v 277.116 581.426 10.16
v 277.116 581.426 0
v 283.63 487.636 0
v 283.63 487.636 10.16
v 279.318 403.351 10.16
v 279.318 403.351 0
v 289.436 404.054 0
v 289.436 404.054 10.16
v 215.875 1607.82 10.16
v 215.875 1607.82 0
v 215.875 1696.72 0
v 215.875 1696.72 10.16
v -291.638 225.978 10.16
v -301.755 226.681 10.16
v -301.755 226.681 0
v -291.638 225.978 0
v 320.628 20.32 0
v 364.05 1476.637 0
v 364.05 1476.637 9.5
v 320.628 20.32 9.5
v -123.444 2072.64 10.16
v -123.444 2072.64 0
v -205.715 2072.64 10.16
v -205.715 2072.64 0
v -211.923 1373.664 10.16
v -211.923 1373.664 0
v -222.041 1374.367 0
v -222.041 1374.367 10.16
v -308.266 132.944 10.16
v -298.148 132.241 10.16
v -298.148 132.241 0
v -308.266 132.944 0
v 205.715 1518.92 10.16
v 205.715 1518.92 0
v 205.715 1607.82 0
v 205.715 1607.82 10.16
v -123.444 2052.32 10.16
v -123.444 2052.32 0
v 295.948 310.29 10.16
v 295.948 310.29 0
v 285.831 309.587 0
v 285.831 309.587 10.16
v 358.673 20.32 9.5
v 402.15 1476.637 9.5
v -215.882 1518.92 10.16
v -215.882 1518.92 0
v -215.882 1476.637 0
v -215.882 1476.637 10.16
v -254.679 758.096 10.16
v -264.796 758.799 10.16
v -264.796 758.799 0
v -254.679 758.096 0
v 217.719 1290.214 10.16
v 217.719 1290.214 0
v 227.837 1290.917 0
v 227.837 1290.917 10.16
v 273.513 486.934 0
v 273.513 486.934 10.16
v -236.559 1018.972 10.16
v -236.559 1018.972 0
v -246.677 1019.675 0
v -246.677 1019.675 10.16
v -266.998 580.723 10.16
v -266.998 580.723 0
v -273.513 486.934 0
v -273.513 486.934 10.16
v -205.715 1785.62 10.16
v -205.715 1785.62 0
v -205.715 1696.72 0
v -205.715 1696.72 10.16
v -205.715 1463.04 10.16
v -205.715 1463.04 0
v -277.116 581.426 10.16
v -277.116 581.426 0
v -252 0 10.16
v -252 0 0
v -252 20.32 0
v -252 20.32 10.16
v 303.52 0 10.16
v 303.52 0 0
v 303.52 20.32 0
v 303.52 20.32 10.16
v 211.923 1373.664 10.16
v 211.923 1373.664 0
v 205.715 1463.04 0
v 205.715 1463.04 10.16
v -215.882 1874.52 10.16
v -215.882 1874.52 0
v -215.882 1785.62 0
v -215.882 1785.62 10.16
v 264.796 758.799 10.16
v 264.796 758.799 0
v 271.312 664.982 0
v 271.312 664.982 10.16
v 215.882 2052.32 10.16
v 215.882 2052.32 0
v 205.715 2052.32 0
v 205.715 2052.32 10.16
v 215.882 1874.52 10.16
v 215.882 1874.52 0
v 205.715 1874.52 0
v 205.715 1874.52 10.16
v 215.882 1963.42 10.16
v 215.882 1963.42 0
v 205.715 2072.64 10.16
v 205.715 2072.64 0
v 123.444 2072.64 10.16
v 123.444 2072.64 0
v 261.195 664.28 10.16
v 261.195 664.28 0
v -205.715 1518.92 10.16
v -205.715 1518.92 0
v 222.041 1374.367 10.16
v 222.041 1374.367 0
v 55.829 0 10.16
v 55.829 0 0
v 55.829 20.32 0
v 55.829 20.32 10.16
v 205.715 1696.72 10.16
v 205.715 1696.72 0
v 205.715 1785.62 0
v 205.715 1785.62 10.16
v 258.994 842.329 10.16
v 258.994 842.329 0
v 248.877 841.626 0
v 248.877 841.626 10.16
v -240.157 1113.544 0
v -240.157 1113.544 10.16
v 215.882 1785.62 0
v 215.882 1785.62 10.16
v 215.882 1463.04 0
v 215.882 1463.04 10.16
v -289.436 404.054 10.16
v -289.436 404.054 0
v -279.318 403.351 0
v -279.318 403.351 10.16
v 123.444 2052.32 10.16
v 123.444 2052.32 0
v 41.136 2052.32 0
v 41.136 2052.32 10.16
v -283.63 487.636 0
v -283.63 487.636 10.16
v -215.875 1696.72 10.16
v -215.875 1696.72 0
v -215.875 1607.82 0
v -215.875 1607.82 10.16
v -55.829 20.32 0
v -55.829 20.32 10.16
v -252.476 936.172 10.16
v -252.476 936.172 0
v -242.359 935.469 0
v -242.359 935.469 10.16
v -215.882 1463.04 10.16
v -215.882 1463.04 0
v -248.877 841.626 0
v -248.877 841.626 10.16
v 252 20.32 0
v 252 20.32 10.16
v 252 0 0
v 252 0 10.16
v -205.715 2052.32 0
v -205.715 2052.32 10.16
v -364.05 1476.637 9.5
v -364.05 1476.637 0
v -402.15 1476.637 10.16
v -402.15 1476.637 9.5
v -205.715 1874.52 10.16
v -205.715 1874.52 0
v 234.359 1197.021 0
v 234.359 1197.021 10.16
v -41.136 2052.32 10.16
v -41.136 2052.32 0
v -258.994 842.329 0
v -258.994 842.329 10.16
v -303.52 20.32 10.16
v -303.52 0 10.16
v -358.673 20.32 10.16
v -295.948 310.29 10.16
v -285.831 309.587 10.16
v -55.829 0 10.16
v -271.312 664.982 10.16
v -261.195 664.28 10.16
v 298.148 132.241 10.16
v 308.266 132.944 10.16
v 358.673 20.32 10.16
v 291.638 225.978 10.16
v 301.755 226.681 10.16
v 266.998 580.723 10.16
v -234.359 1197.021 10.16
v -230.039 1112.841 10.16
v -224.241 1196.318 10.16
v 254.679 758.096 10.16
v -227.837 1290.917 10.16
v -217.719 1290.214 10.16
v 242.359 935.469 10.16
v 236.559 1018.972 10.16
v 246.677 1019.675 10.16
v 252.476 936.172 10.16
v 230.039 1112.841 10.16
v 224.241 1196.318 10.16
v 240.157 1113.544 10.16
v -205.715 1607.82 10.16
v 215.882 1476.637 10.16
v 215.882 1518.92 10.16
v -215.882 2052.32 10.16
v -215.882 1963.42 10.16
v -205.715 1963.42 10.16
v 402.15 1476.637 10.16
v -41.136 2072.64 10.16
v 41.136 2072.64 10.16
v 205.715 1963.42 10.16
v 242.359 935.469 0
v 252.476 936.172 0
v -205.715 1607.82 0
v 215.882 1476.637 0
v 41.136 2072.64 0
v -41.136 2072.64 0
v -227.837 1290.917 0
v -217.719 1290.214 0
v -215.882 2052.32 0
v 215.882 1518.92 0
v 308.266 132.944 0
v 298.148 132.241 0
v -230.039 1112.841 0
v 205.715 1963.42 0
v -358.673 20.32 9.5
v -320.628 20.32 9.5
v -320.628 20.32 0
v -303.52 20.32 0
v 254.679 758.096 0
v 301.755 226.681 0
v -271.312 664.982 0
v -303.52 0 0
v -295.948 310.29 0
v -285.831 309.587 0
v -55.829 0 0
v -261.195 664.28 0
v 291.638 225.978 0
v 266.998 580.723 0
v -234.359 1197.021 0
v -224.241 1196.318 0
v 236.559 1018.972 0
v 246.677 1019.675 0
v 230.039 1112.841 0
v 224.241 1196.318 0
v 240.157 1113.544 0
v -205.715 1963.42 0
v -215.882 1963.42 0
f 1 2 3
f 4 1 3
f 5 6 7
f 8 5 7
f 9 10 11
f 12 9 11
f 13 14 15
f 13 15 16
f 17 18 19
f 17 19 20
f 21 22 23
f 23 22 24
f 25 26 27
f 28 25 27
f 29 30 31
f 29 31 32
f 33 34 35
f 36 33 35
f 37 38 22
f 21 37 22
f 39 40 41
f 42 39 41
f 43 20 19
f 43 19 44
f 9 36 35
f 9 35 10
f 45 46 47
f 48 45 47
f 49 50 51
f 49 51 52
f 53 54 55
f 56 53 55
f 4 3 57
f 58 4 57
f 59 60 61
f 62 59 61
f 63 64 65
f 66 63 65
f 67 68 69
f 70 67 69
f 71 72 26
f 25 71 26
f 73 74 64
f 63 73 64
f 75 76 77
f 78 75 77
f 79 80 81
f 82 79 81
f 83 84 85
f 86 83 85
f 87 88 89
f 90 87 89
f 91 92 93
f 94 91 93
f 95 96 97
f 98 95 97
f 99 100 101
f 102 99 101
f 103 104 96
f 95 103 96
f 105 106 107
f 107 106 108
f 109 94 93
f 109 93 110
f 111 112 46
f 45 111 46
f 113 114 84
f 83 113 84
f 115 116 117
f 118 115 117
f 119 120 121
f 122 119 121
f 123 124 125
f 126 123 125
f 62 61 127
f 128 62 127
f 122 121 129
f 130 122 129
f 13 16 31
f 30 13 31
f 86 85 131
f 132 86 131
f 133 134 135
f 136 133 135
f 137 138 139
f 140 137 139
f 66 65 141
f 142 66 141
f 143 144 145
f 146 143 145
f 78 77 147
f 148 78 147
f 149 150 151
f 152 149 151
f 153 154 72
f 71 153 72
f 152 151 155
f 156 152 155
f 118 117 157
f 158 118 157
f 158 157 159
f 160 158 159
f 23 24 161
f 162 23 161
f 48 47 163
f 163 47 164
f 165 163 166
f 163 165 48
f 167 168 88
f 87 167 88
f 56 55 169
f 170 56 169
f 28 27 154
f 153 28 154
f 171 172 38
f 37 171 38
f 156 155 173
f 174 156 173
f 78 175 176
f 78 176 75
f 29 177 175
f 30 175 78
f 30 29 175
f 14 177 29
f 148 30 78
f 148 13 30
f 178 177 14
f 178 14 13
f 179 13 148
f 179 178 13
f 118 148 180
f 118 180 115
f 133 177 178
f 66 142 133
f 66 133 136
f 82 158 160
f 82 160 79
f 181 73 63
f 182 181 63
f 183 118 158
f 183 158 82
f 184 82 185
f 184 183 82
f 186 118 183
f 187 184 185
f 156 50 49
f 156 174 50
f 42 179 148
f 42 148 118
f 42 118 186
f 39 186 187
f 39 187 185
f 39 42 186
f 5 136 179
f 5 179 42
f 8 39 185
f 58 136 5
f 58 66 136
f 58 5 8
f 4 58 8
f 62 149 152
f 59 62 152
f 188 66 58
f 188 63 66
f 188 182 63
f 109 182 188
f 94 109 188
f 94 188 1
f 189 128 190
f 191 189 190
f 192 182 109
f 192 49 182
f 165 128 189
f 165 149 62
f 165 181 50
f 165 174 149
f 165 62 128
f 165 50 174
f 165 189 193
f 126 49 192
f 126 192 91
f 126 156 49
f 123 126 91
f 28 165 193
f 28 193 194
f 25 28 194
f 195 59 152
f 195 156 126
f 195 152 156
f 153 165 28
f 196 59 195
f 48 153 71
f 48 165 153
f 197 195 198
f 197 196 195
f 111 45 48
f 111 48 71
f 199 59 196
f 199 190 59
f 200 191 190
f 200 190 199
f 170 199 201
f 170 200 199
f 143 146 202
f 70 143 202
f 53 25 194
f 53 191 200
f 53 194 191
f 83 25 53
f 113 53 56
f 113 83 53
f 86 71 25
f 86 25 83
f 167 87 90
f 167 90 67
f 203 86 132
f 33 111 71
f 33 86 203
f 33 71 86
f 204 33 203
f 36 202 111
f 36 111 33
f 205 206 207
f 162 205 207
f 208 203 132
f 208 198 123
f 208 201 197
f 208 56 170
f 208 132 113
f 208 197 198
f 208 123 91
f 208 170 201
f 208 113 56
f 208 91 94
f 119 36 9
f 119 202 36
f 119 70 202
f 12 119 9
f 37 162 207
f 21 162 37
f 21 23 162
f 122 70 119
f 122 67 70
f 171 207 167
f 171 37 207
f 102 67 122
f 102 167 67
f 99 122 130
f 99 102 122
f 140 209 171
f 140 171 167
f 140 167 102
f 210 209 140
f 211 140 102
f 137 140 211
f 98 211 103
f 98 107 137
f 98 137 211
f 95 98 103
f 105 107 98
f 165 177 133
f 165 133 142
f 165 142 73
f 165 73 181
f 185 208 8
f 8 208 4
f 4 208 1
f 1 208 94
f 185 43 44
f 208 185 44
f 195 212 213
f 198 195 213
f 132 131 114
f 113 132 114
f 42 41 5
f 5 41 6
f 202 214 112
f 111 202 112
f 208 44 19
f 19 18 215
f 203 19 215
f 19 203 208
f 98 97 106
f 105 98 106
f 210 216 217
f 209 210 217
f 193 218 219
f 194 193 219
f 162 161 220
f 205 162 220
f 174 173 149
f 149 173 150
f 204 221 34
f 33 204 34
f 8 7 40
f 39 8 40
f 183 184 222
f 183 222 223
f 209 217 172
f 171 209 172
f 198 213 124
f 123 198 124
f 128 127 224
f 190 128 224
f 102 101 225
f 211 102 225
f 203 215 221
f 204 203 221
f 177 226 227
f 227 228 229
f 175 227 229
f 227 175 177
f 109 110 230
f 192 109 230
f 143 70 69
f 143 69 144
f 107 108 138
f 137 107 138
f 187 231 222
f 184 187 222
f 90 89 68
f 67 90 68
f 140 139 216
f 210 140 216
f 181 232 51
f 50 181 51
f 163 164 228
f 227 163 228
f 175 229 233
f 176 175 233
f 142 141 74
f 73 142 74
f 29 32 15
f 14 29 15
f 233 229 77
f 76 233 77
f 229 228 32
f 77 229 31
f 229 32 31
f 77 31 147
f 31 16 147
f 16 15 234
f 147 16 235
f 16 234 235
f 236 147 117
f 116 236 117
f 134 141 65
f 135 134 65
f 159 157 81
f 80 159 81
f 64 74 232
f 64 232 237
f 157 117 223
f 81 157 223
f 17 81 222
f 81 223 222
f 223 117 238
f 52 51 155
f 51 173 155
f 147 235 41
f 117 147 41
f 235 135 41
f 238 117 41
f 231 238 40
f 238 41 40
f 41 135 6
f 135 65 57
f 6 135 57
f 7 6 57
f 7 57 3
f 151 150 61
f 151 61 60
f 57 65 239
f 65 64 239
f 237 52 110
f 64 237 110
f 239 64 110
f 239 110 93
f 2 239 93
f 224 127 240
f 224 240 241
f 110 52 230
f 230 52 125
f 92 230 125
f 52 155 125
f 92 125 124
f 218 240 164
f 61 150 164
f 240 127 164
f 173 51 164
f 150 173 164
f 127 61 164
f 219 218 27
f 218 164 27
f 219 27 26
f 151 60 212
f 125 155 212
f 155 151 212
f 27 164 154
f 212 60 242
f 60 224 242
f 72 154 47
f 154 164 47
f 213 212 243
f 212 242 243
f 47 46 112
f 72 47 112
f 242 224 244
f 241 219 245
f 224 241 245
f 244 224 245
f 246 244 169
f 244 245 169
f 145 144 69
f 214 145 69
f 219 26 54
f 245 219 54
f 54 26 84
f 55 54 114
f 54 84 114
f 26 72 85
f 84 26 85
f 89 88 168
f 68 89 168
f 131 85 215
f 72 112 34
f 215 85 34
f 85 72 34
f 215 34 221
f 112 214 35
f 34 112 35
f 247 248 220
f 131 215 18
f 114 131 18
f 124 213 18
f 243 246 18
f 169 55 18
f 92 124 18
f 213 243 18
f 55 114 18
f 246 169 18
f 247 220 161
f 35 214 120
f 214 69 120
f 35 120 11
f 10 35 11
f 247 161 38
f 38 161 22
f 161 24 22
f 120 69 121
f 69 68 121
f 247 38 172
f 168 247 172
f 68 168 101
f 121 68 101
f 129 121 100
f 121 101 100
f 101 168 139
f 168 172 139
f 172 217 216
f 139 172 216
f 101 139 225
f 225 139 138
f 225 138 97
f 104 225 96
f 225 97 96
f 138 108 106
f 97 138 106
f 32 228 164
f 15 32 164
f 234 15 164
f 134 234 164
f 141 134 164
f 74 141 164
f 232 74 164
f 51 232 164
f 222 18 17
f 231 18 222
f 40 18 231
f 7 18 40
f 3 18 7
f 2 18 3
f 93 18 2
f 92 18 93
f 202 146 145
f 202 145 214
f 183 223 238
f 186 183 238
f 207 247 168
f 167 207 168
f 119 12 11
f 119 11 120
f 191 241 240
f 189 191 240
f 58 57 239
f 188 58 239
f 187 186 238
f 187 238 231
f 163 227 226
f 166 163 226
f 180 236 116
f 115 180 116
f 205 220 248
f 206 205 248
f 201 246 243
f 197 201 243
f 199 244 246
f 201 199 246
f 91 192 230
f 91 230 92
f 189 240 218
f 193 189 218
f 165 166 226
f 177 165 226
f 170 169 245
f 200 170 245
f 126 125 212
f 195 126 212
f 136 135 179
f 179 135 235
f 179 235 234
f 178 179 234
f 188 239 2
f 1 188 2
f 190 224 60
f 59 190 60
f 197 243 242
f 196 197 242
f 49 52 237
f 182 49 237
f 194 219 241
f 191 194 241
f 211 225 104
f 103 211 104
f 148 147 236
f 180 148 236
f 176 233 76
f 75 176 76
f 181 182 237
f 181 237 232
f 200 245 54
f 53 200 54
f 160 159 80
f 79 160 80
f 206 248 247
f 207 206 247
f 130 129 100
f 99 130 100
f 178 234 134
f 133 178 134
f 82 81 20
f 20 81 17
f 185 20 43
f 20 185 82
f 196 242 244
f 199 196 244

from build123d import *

# Parameters (mm, degrees)
BOSS_EXTRUDE1_DEPTH = 10.16
CUT_LOFT1_DEPTH     = 9.5


# Read off the part's stored shape, not the designer's step: Cut-Loft1
with BuildPart() as part:
    # Sketch1 → Boss-Extrude1 (new body)
    # profile 1 of 2: a face of its own
    with BuildSketch(Plane.XY):
        Polygon((205.715298803, 2072.64), (123.444, 2072.64), (123.444, 2052.32), (41.135649402, 2052.32), (41.135649402, 2072.64), (-41.135649402, 2072.64), (-41.135649402, 2052.32), (-123.444, 2052.32), (-123.444, 2072.64), (-205.715298803, 2072.64), (-205.715298803, 2052.32), (-215.881789204, 2052.32), (-215.881789204, 1963.42), (-205.715298803, 1963.42), (-205.715298803, 1874.52), (-215.881789204, 1874.52), (-215.881789204, 1785.62), (-205.715298803, 1785.62), (-205.715298803, 1696.72), (-215.875298803, 1696.72), (-215.875298803, 1607.82), (-205.715298803, 1607.82), (-205.715298803, 1518.92), (205.715298803, 1518.92), (205.715298803, 1607.82), (215.875298803, 1607.82), (215.875298803, 1696.72), (205.715298803, 1696.72), (205.715298803, 1785.62), (215.881789204, 1785.62), (215.881789204, 1874.52), (205.715298803, 1874.52), (205.715298803, 1963.42), (215.881789204, 1963.42), (215.881789204, 2052.32), (205.715298803, 2052.32), align=None)
    # profile 2 of 2: a face of its own
    with BuildSketch(Plane.XY):
        Polygon((215.881789204, 1518.92), (205.715298803, 1518.92), (-205.715298803, 1518.92), (-215.881789204, 1518.92), (-215.881789204, 1476.636861244), (-402.149872815, 1476.636861244), (-358.672996954, 20.32), (-303.52, 20.32), (-303.52, 0), (-252, 0), (-252, 20.32), (-55.8292, 20.32), (-55.8292, 0), (55.8292, 0), (55.8292, 20.32), (252, 20.32), (252, 0), (303.52, 0), (303.52, 20.32), (358.672996954, 20.32), (402.149872815, 1476.636861244), (215.881789204, 1476.636861244), align=None)
        Polygon((-308.266124544, 132.94397688), (-301.755453134, 226.680843836), (-291.63777305, 225.978101227), (-298.14844446, 132.241234271), align=None, mode=Mode.SUBTRACT)
        Polygon((-289.435698895, 404.053512688), (-279.318018811, 403.350770078), (-285.830533081, 309.587370692), (-295.948213166, 310.290113301), align=None, mode=Mode.SUBTRACT)
        Polygon((-283.630301787, 487.636249721), (-277.115944656, 581.426181539), (-266.998264572, 580.72343893), (-273.512621703, 486.933507112), align=None, mode=Mode.SUBTRACT)
        Polygon((-264.796190418, 758.798850391), (-254.678510334, 758.096107781), (-261.194710324, 664.279643533), (-271.312390408, 664.982386142), align=None, mode=Mode.SUBTRACT)
        Polygon((-252.476436179, 936.171519242), (-242.358756095, 935.468776633), (-248.876798945, 841.625779953), (-258.99447903, 842.328522563), align=None, mode=Mode.SUBTRACT)
        Polygon((301.755453134, 226.680843836), (308.266124544, 132.94397688), (298.14844446, 132.241234271), (291.63777305, 225.978101227), align=None, mode=Mode.SUBTRACT)
        Polygon((279.318018811, 403.350770078), (289.435698895, 404.053512688), (295.948213166, 310.290113301), (285.830533081, 309.587370692), align=None, mode=Mode.SUBTRACT)
        Polygon((277.115944656, 581.426181539), (283.630301787, 487.636249721), (273.512621703, 486.933507112), (266.998264572, 580.72343893), align=None, mode=Mode.SUBTRACT)
        Polygon((254.678510334, 758.096107781), (264.796190418, 758.798850391), (271.312390408, 664.982386142), (261.194710324, 664.279643533), align=None, mode=Mode.SUBTRACT)
        Polygon((242.358756095, 935.468776633), (252.476436179, 936.171519242), (258.99447903, 842.328522563), (248.876798945, 841.625779953), align=None, mode=Mode.SUBTRACT)
        Polygon((-240.15668194, 1113.544188093), (-230.039001856, 1112.841445484), (-236.558887567, 1018.971916374), (-246.676567651, 1019.674658983), align=None, mode=Mode.SUBTRACT)
        Polygon((-227.836927701, 1290.916856945), (-217.719247617, 1290.214114336), (-224.240976188, 1196.318052795), (-234.358656272, 1197.020795404), align=None, mode=Mode.SUBTRACT)
        Polygon((-215.881789204, 1463.040000035), (-214.479068593, 1463.040000035), (-205.715298803, 1463.040000035), (-211.92306481, 1373.664189215), (-222.040744894, 1374.366931824), align=None, mode=Mode.SUBTRACT)
        Polygon((230.039001856, 1112.841445484), (240.15668194, 1113.544188093), (246.676567651, 1019.674658983), (236.558887567, 1018.971916374), align=None, mode=Mode.SUBTRACT)
        Polygon((217.719247617, 1290.214114336), (227.836927701, 1290.916856945), (234.358656272, 1197.020795404), (224.240976188, 1196.318052795), align=None, mode=Mode.SUBTRACT)
        Polygon((205.715298803, 1463.040000035), (215.881789204, 1463.040000035), (222.040744894, 1374.366931824), (211.92306481, 1373.664189215), align=None, mode=Mode.SUBTRACT)
    extrude(amount=BOSS_EXTRUDE1_DEPTH)

    # Cut-Loft1 outline → Cut-Loft1 (cut)
    with BuildSketch(Plane.XY):
        Polygon((402.149872815, 1476.636861244), (364.049872815, 1476.636861244), (320.627659668, 20.32), (358.672996954, 20.32), align=None)
    cut_loft1 = extrude(amount=CUT_LOFT1_DEPTH, mode=Mode.SUBTRACT)

    # Mirror1: Cut-Loft1 across plane
    add(cut_loft1.mirror(Plane(origin=(0, 0, 0), x_dir=(0, 0, 1), z_dir=(1, 0, 0))), mode=Mode.SUBTRACT)


solid = part.part
